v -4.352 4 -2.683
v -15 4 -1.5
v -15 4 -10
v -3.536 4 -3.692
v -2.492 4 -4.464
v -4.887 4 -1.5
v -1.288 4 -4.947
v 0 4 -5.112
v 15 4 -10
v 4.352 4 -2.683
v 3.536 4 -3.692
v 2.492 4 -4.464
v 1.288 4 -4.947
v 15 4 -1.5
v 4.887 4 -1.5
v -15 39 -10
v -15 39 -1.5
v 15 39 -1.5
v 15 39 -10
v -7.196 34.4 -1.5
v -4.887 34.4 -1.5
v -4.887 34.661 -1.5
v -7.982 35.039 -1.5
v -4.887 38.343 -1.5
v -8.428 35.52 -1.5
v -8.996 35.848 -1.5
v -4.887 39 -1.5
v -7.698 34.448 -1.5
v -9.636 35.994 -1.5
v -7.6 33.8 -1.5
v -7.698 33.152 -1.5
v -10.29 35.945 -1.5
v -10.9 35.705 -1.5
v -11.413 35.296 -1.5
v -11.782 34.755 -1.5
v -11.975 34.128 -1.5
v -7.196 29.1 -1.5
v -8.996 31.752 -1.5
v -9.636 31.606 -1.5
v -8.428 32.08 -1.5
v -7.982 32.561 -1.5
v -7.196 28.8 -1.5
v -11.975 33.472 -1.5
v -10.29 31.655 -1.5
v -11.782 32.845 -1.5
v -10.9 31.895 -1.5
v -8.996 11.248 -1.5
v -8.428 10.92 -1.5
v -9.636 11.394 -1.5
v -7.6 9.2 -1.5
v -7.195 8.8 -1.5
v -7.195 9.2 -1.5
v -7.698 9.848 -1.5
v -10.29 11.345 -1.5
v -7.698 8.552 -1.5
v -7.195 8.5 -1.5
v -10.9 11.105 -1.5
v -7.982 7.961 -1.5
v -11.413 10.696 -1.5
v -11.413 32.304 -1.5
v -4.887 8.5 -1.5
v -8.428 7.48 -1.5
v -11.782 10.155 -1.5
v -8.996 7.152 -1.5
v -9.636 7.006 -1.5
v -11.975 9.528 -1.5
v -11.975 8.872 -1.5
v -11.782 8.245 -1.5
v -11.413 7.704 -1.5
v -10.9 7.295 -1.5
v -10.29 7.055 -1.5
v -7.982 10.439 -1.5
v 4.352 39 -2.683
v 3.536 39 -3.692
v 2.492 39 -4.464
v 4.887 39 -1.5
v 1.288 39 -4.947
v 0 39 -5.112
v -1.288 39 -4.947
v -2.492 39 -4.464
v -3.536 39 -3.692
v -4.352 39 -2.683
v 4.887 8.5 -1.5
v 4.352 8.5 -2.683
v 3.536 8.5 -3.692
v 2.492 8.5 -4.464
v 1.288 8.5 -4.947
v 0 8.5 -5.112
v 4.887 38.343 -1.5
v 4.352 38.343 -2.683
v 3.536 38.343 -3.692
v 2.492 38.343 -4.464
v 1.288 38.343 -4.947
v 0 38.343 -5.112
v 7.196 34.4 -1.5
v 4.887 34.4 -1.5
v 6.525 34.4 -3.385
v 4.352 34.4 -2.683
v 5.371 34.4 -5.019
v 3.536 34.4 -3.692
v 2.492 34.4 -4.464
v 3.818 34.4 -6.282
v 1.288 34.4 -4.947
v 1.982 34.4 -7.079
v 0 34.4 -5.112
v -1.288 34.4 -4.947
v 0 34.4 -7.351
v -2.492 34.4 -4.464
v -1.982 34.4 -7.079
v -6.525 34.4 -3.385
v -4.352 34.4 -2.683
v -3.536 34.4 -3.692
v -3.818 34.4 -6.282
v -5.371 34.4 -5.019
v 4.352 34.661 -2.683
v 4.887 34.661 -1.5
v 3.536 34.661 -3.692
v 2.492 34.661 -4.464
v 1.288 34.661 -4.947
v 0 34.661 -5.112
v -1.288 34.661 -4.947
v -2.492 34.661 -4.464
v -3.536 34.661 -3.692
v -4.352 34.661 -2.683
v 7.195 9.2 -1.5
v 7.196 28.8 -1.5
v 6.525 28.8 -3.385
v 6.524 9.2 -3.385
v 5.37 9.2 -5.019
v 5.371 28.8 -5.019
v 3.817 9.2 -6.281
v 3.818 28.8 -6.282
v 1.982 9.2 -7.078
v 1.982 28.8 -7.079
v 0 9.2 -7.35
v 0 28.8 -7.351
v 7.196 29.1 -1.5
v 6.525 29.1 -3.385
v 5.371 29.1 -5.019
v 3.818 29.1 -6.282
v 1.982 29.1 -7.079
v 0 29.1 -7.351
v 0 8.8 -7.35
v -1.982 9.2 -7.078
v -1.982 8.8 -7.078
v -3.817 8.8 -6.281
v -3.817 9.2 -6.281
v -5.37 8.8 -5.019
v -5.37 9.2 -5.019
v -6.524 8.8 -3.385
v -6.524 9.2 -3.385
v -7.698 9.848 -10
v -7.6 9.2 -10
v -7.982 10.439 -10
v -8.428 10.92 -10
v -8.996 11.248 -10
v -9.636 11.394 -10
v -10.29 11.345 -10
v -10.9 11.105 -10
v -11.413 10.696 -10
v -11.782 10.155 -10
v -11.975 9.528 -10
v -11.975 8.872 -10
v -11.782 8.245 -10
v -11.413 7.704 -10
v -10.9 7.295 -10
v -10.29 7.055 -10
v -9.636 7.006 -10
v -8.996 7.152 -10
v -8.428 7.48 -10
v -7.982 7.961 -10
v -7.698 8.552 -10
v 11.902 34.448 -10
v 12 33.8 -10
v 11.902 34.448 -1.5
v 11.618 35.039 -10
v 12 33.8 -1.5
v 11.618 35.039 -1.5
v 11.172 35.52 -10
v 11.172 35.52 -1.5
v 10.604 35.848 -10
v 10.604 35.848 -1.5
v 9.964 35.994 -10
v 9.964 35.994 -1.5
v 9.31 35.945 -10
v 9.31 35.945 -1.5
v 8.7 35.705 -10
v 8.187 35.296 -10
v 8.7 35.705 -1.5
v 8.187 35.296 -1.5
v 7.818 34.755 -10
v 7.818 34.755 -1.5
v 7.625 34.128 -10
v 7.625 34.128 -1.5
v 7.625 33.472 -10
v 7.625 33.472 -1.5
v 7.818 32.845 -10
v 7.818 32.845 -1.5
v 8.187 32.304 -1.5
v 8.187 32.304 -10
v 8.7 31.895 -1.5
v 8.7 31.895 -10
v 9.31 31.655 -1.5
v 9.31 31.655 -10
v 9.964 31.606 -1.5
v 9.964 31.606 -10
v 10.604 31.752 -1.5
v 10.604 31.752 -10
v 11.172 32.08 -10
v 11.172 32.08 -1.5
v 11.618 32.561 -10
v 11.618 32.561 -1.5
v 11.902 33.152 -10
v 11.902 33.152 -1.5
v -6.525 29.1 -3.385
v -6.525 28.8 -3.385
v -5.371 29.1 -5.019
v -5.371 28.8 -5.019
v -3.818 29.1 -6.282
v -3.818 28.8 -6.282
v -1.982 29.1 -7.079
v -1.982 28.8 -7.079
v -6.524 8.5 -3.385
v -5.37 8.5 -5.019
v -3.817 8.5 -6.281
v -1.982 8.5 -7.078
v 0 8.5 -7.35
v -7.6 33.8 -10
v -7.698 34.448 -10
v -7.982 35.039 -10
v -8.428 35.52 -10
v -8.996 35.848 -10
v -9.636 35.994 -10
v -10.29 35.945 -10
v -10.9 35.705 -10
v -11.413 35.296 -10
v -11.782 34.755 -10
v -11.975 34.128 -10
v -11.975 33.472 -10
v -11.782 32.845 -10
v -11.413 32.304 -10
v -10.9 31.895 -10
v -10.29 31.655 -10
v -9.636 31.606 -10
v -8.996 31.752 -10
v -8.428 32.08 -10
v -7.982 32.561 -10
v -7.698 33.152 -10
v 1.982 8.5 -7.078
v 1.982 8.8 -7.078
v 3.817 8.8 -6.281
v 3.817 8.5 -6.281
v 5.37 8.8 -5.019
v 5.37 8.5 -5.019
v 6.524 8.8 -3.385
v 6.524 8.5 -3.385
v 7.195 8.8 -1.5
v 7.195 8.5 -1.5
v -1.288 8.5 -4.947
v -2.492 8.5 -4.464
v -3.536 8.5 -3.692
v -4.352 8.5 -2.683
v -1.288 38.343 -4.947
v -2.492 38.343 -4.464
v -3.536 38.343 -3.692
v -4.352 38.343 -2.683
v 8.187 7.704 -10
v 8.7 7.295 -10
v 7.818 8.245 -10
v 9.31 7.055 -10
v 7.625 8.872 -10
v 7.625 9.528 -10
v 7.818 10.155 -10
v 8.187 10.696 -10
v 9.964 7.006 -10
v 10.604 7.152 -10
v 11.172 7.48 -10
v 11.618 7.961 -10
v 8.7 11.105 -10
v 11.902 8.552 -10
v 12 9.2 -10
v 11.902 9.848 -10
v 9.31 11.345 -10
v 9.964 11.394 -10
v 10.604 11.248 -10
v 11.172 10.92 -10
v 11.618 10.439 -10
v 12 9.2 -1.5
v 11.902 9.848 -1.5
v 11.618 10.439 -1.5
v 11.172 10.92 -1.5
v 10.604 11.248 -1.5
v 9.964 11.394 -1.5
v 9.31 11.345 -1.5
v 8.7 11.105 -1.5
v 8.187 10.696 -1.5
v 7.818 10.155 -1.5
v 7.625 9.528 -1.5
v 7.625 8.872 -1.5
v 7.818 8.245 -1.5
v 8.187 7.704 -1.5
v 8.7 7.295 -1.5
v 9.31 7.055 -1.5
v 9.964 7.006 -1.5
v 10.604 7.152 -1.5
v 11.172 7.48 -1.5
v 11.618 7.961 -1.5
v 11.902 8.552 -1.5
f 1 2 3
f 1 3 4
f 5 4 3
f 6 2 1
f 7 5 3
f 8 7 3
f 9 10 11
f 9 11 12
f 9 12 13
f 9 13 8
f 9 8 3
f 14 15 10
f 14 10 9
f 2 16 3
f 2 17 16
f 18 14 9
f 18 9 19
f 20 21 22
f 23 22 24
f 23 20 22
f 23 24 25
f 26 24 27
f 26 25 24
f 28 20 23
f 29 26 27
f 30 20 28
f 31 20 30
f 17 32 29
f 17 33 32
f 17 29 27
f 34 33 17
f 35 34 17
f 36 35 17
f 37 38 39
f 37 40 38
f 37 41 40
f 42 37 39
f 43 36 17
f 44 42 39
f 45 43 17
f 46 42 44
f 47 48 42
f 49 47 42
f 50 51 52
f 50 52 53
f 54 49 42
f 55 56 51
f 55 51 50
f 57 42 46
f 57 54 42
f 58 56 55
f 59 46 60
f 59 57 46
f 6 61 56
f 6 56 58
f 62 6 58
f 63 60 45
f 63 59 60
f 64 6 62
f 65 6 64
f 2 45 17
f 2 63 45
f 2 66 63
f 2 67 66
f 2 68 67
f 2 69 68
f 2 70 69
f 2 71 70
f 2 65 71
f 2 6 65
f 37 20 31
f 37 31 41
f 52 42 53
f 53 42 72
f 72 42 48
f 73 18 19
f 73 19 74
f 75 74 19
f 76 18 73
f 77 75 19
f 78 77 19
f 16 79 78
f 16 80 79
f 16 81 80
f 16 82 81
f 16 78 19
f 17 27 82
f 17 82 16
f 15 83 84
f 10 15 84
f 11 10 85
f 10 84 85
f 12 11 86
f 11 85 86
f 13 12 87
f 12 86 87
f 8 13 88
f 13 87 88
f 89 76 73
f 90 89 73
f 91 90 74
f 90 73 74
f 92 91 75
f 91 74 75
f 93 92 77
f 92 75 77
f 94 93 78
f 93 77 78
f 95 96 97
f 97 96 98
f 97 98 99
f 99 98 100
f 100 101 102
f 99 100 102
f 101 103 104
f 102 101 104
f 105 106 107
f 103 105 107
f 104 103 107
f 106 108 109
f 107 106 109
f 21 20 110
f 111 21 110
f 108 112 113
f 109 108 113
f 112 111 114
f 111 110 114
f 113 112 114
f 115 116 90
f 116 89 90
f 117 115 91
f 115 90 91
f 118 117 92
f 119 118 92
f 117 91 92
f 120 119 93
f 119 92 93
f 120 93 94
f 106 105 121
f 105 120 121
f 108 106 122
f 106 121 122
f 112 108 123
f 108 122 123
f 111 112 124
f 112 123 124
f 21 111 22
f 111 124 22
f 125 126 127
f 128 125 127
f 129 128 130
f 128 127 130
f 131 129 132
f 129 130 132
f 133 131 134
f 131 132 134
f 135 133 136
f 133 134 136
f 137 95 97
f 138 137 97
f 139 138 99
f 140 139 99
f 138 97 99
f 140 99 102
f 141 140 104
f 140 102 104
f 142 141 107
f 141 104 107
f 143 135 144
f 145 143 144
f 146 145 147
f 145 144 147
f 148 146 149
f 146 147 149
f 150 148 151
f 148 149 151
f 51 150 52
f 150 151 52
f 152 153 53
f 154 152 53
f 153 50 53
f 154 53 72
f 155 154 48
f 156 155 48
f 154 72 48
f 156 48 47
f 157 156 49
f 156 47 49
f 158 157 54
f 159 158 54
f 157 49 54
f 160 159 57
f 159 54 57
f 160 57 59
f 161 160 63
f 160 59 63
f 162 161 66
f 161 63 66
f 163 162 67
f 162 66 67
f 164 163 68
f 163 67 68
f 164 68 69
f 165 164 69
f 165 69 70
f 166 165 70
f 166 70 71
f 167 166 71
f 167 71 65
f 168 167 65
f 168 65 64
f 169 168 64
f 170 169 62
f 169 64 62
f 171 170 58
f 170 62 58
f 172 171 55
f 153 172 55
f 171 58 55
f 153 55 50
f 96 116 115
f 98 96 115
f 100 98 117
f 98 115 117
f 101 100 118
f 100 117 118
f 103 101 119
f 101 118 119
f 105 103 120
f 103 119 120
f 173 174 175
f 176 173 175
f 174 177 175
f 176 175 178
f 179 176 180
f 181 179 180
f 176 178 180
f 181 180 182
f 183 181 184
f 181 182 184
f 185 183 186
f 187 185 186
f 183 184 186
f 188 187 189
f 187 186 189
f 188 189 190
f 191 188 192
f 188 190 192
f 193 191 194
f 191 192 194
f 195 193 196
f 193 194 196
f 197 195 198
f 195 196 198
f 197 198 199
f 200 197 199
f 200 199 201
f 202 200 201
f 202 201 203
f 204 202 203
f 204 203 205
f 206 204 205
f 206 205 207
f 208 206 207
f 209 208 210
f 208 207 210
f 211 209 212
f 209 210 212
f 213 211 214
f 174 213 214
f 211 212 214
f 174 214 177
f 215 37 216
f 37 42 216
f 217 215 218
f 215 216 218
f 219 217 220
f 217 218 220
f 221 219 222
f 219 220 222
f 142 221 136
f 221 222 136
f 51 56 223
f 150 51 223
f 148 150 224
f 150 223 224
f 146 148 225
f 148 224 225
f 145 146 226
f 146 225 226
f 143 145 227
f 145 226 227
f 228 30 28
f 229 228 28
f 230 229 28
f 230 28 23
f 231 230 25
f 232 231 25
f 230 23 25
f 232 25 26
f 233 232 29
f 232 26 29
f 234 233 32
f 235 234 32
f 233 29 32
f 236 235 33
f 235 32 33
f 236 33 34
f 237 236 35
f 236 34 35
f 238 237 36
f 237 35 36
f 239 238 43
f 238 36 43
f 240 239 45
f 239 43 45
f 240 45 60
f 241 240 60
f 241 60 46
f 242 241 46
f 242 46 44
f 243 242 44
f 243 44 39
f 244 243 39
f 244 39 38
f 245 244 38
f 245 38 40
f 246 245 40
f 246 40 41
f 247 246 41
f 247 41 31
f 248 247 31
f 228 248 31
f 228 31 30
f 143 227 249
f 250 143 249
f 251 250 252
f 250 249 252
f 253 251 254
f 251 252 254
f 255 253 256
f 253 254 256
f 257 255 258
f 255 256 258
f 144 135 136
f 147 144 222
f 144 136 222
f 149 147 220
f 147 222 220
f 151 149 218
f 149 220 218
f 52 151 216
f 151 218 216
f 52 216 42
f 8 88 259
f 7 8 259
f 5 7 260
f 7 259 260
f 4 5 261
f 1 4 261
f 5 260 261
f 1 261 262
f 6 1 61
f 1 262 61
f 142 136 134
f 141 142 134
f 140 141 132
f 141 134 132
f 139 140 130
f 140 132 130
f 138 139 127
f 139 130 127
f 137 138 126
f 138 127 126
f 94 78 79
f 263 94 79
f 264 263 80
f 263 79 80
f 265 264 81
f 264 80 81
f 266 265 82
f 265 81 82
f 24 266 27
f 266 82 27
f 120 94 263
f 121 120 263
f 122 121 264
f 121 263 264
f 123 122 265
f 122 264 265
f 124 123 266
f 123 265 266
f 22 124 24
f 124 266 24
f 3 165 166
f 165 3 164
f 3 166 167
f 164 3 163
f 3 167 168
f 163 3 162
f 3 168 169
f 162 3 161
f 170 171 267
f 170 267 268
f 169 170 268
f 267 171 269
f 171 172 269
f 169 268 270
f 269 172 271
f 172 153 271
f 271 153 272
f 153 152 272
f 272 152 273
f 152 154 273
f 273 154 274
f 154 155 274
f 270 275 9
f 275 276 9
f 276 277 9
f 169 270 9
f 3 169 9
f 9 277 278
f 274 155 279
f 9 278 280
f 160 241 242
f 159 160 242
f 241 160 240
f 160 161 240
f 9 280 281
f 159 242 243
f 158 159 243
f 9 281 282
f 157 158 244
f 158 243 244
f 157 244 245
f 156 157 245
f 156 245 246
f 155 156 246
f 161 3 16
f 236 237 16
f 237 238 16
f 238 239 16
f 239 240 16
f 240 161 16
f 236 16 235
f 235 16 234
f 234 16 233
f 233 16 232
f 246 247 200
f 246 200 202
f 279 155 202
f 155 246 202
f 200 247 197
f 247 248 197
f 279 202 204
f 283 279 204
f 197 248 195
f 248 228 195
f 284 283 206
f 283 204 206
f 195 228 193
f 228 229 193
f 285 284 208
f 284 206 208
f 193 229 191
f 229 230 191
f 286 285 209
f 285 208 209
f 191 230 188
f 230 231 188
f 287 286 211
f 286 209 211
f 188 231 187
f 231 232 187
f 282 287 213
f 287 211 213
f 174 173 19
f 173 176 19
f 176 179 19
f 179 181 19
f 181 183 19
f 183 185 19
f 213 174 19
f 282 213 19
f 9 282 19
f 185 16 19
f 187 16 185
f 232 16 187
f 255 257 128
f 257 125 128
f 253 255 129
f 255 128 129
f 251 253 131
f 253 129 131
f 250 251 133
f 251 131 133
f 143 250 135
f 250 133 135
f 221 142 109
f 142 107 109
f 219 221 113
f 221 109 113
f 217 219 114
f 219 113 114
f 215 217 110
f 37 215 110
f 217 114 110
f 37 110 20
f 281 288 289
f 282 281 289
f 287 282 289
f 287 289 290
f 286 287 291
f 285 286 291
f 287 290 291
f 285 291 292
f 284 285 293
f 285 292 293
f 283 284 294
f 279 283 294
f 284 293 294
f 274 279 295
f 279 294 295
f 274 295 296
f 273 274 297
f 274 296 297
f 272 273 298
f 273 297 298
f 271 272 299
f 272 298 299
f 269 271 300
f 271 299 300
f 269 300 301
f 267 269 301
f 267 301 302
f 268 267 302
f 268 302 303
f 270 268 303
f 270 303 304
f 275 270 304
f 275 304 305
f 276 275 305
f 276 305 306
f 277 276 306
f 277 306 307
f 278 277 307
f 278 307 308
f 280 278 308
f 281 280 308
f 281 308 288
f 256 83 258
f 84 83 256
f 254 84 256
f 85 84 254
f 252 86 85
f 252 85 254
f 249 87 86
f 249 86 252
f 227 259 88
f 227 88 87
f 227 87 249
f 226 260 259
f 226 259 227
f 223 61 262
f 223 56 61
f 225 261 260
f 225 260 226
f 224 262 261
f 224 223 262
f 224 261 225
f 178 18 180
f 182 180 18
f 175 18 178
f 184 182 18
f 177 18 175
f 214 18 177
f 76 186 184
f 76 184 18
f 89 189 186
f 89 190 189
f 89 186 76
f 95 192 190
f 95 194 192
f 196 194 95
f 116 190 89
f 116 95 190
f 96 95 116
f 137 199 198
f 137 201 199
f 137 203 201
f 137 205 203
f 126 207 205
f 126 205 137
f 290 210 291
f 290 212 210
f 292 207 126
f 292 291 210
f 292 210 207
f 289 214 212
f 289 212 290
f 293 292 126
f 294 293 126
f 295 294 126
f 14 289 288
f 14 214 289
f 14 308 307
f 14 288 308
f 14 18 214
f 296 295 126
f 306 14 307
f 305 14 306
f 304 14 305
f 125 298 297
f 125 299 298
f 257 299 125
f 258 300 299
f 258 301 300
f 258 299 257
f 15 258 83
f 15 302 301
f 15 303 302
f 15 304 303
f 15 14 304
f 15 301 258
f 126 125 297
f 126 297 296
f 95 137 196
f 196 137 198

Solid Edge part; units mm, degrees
sketch "Sketch1" plane through (0, 0, 0) normal (0, 0, 1) x (1, 0, 0)
  circle A0 centre (-9.8, 33.8) radius 2.2
  circle A1 centre (-9.8, 9.2) radius 2.2
  circle A2 centre (9.8, 9.2) radius 2.2
  circle A3 centre (9.8, 33.8) radius 2.2
  line L0 (-15, 4) -> (15, 4)
  line L1 (15, 4) -> (15, 39)
  line L2 (15, 39) -> (-15, 39)
  line L3 (-15, 39) -> (-15, 4)
  dimension "D1" = 35
  dimension "D2" = 30
  dimension "D3" = 15
  dimension "D4" = 3
  dimension "D5" = 4.4
  dimension "D6" = 3
  dimension "D7" = 3
  dimension "D8" = 21.8
  dimension "D9" = 3
extrude "Protrusion1" add sketch "Sketch1" against normal blind 10
sketch "Sketch2" plane through (0, 0, 0) normal (1, 0, 0) x (0, 1, 0)
  line L0 (8.8, -7.35) -> (8.5, -7.35)
  line L1 (8.5, -7.35) -> (8.5, -5.1123)
  line L2 (2.721, -5.1123) -> (8.5, -5.1123)
  line L3 (2.721, -5.1123) -> (-1.0103, -5.1123)
  line L4 (-1.0103, -5.1123) -> (-1.0103, -3.9681)
  line L5 (-1.0103, -2.774) -> (-1.0103, -3.9681)
  line L6 (-12.5526, -2.774) -> (-1.0103, -2.774)
  line L7 (-12.5526, 0) -> (-12.5526, -2.774)
  line L8 (39.4373, 0) -> (-12.5526, 0)
  line L9 (39.4373, -5.1123) -> (39.4373, 0)
  line L10 (38.3428, -5.1123) -> (39.4373, -5.1123)
  line L11 (34.6612, -5.1123) -> (38.3428, -5.1123)
  line L12 (34.4, -5.1123) -> (34.6612, -5.1123)
  line L13 (34.4, -7.3511) -> (34.4, -5.1123)
  line L14 (29.1, -7.3511) -> (34.4, -7.3511)
  line L15 (29.1, -7.3511) -> (28.8, -7.3511)
  line L16 (9.2, -7.35) -> (28.8, -7.3511)
  line L17 (8.8023, -7.35) -> (9.2, -7.35)
  dimension "D1" = 0.3
  dimension "D2" = 0.3
  dimension "D3" = 7.3511
  dimension "D4" = 0.3
revolve "RevolvedCutout1" cut sketch "Sketch2" angle 360 about axis through (0, -60, 0) along (0, 1, 0)
sketch "Sketch3" plane through (0, 4, -5) normal (0, -1, 0) x (1, 0, 0)
  line L0 (-23.1839, 5) -> (21.8988, 5)
  line L1 (21.8988, 5) -> (21.8988, 3.5)
  line L2 (21.8988, 3.5) -> (-23.1839, 3.5)
  line L3 (-23.1839, 3.5) -> (-23.1839, 5)
  dimension "D1" = 1.5
extrude "ExtrudedCutout_2" cut sketch "Sketch3" against normal blind 318.8634
